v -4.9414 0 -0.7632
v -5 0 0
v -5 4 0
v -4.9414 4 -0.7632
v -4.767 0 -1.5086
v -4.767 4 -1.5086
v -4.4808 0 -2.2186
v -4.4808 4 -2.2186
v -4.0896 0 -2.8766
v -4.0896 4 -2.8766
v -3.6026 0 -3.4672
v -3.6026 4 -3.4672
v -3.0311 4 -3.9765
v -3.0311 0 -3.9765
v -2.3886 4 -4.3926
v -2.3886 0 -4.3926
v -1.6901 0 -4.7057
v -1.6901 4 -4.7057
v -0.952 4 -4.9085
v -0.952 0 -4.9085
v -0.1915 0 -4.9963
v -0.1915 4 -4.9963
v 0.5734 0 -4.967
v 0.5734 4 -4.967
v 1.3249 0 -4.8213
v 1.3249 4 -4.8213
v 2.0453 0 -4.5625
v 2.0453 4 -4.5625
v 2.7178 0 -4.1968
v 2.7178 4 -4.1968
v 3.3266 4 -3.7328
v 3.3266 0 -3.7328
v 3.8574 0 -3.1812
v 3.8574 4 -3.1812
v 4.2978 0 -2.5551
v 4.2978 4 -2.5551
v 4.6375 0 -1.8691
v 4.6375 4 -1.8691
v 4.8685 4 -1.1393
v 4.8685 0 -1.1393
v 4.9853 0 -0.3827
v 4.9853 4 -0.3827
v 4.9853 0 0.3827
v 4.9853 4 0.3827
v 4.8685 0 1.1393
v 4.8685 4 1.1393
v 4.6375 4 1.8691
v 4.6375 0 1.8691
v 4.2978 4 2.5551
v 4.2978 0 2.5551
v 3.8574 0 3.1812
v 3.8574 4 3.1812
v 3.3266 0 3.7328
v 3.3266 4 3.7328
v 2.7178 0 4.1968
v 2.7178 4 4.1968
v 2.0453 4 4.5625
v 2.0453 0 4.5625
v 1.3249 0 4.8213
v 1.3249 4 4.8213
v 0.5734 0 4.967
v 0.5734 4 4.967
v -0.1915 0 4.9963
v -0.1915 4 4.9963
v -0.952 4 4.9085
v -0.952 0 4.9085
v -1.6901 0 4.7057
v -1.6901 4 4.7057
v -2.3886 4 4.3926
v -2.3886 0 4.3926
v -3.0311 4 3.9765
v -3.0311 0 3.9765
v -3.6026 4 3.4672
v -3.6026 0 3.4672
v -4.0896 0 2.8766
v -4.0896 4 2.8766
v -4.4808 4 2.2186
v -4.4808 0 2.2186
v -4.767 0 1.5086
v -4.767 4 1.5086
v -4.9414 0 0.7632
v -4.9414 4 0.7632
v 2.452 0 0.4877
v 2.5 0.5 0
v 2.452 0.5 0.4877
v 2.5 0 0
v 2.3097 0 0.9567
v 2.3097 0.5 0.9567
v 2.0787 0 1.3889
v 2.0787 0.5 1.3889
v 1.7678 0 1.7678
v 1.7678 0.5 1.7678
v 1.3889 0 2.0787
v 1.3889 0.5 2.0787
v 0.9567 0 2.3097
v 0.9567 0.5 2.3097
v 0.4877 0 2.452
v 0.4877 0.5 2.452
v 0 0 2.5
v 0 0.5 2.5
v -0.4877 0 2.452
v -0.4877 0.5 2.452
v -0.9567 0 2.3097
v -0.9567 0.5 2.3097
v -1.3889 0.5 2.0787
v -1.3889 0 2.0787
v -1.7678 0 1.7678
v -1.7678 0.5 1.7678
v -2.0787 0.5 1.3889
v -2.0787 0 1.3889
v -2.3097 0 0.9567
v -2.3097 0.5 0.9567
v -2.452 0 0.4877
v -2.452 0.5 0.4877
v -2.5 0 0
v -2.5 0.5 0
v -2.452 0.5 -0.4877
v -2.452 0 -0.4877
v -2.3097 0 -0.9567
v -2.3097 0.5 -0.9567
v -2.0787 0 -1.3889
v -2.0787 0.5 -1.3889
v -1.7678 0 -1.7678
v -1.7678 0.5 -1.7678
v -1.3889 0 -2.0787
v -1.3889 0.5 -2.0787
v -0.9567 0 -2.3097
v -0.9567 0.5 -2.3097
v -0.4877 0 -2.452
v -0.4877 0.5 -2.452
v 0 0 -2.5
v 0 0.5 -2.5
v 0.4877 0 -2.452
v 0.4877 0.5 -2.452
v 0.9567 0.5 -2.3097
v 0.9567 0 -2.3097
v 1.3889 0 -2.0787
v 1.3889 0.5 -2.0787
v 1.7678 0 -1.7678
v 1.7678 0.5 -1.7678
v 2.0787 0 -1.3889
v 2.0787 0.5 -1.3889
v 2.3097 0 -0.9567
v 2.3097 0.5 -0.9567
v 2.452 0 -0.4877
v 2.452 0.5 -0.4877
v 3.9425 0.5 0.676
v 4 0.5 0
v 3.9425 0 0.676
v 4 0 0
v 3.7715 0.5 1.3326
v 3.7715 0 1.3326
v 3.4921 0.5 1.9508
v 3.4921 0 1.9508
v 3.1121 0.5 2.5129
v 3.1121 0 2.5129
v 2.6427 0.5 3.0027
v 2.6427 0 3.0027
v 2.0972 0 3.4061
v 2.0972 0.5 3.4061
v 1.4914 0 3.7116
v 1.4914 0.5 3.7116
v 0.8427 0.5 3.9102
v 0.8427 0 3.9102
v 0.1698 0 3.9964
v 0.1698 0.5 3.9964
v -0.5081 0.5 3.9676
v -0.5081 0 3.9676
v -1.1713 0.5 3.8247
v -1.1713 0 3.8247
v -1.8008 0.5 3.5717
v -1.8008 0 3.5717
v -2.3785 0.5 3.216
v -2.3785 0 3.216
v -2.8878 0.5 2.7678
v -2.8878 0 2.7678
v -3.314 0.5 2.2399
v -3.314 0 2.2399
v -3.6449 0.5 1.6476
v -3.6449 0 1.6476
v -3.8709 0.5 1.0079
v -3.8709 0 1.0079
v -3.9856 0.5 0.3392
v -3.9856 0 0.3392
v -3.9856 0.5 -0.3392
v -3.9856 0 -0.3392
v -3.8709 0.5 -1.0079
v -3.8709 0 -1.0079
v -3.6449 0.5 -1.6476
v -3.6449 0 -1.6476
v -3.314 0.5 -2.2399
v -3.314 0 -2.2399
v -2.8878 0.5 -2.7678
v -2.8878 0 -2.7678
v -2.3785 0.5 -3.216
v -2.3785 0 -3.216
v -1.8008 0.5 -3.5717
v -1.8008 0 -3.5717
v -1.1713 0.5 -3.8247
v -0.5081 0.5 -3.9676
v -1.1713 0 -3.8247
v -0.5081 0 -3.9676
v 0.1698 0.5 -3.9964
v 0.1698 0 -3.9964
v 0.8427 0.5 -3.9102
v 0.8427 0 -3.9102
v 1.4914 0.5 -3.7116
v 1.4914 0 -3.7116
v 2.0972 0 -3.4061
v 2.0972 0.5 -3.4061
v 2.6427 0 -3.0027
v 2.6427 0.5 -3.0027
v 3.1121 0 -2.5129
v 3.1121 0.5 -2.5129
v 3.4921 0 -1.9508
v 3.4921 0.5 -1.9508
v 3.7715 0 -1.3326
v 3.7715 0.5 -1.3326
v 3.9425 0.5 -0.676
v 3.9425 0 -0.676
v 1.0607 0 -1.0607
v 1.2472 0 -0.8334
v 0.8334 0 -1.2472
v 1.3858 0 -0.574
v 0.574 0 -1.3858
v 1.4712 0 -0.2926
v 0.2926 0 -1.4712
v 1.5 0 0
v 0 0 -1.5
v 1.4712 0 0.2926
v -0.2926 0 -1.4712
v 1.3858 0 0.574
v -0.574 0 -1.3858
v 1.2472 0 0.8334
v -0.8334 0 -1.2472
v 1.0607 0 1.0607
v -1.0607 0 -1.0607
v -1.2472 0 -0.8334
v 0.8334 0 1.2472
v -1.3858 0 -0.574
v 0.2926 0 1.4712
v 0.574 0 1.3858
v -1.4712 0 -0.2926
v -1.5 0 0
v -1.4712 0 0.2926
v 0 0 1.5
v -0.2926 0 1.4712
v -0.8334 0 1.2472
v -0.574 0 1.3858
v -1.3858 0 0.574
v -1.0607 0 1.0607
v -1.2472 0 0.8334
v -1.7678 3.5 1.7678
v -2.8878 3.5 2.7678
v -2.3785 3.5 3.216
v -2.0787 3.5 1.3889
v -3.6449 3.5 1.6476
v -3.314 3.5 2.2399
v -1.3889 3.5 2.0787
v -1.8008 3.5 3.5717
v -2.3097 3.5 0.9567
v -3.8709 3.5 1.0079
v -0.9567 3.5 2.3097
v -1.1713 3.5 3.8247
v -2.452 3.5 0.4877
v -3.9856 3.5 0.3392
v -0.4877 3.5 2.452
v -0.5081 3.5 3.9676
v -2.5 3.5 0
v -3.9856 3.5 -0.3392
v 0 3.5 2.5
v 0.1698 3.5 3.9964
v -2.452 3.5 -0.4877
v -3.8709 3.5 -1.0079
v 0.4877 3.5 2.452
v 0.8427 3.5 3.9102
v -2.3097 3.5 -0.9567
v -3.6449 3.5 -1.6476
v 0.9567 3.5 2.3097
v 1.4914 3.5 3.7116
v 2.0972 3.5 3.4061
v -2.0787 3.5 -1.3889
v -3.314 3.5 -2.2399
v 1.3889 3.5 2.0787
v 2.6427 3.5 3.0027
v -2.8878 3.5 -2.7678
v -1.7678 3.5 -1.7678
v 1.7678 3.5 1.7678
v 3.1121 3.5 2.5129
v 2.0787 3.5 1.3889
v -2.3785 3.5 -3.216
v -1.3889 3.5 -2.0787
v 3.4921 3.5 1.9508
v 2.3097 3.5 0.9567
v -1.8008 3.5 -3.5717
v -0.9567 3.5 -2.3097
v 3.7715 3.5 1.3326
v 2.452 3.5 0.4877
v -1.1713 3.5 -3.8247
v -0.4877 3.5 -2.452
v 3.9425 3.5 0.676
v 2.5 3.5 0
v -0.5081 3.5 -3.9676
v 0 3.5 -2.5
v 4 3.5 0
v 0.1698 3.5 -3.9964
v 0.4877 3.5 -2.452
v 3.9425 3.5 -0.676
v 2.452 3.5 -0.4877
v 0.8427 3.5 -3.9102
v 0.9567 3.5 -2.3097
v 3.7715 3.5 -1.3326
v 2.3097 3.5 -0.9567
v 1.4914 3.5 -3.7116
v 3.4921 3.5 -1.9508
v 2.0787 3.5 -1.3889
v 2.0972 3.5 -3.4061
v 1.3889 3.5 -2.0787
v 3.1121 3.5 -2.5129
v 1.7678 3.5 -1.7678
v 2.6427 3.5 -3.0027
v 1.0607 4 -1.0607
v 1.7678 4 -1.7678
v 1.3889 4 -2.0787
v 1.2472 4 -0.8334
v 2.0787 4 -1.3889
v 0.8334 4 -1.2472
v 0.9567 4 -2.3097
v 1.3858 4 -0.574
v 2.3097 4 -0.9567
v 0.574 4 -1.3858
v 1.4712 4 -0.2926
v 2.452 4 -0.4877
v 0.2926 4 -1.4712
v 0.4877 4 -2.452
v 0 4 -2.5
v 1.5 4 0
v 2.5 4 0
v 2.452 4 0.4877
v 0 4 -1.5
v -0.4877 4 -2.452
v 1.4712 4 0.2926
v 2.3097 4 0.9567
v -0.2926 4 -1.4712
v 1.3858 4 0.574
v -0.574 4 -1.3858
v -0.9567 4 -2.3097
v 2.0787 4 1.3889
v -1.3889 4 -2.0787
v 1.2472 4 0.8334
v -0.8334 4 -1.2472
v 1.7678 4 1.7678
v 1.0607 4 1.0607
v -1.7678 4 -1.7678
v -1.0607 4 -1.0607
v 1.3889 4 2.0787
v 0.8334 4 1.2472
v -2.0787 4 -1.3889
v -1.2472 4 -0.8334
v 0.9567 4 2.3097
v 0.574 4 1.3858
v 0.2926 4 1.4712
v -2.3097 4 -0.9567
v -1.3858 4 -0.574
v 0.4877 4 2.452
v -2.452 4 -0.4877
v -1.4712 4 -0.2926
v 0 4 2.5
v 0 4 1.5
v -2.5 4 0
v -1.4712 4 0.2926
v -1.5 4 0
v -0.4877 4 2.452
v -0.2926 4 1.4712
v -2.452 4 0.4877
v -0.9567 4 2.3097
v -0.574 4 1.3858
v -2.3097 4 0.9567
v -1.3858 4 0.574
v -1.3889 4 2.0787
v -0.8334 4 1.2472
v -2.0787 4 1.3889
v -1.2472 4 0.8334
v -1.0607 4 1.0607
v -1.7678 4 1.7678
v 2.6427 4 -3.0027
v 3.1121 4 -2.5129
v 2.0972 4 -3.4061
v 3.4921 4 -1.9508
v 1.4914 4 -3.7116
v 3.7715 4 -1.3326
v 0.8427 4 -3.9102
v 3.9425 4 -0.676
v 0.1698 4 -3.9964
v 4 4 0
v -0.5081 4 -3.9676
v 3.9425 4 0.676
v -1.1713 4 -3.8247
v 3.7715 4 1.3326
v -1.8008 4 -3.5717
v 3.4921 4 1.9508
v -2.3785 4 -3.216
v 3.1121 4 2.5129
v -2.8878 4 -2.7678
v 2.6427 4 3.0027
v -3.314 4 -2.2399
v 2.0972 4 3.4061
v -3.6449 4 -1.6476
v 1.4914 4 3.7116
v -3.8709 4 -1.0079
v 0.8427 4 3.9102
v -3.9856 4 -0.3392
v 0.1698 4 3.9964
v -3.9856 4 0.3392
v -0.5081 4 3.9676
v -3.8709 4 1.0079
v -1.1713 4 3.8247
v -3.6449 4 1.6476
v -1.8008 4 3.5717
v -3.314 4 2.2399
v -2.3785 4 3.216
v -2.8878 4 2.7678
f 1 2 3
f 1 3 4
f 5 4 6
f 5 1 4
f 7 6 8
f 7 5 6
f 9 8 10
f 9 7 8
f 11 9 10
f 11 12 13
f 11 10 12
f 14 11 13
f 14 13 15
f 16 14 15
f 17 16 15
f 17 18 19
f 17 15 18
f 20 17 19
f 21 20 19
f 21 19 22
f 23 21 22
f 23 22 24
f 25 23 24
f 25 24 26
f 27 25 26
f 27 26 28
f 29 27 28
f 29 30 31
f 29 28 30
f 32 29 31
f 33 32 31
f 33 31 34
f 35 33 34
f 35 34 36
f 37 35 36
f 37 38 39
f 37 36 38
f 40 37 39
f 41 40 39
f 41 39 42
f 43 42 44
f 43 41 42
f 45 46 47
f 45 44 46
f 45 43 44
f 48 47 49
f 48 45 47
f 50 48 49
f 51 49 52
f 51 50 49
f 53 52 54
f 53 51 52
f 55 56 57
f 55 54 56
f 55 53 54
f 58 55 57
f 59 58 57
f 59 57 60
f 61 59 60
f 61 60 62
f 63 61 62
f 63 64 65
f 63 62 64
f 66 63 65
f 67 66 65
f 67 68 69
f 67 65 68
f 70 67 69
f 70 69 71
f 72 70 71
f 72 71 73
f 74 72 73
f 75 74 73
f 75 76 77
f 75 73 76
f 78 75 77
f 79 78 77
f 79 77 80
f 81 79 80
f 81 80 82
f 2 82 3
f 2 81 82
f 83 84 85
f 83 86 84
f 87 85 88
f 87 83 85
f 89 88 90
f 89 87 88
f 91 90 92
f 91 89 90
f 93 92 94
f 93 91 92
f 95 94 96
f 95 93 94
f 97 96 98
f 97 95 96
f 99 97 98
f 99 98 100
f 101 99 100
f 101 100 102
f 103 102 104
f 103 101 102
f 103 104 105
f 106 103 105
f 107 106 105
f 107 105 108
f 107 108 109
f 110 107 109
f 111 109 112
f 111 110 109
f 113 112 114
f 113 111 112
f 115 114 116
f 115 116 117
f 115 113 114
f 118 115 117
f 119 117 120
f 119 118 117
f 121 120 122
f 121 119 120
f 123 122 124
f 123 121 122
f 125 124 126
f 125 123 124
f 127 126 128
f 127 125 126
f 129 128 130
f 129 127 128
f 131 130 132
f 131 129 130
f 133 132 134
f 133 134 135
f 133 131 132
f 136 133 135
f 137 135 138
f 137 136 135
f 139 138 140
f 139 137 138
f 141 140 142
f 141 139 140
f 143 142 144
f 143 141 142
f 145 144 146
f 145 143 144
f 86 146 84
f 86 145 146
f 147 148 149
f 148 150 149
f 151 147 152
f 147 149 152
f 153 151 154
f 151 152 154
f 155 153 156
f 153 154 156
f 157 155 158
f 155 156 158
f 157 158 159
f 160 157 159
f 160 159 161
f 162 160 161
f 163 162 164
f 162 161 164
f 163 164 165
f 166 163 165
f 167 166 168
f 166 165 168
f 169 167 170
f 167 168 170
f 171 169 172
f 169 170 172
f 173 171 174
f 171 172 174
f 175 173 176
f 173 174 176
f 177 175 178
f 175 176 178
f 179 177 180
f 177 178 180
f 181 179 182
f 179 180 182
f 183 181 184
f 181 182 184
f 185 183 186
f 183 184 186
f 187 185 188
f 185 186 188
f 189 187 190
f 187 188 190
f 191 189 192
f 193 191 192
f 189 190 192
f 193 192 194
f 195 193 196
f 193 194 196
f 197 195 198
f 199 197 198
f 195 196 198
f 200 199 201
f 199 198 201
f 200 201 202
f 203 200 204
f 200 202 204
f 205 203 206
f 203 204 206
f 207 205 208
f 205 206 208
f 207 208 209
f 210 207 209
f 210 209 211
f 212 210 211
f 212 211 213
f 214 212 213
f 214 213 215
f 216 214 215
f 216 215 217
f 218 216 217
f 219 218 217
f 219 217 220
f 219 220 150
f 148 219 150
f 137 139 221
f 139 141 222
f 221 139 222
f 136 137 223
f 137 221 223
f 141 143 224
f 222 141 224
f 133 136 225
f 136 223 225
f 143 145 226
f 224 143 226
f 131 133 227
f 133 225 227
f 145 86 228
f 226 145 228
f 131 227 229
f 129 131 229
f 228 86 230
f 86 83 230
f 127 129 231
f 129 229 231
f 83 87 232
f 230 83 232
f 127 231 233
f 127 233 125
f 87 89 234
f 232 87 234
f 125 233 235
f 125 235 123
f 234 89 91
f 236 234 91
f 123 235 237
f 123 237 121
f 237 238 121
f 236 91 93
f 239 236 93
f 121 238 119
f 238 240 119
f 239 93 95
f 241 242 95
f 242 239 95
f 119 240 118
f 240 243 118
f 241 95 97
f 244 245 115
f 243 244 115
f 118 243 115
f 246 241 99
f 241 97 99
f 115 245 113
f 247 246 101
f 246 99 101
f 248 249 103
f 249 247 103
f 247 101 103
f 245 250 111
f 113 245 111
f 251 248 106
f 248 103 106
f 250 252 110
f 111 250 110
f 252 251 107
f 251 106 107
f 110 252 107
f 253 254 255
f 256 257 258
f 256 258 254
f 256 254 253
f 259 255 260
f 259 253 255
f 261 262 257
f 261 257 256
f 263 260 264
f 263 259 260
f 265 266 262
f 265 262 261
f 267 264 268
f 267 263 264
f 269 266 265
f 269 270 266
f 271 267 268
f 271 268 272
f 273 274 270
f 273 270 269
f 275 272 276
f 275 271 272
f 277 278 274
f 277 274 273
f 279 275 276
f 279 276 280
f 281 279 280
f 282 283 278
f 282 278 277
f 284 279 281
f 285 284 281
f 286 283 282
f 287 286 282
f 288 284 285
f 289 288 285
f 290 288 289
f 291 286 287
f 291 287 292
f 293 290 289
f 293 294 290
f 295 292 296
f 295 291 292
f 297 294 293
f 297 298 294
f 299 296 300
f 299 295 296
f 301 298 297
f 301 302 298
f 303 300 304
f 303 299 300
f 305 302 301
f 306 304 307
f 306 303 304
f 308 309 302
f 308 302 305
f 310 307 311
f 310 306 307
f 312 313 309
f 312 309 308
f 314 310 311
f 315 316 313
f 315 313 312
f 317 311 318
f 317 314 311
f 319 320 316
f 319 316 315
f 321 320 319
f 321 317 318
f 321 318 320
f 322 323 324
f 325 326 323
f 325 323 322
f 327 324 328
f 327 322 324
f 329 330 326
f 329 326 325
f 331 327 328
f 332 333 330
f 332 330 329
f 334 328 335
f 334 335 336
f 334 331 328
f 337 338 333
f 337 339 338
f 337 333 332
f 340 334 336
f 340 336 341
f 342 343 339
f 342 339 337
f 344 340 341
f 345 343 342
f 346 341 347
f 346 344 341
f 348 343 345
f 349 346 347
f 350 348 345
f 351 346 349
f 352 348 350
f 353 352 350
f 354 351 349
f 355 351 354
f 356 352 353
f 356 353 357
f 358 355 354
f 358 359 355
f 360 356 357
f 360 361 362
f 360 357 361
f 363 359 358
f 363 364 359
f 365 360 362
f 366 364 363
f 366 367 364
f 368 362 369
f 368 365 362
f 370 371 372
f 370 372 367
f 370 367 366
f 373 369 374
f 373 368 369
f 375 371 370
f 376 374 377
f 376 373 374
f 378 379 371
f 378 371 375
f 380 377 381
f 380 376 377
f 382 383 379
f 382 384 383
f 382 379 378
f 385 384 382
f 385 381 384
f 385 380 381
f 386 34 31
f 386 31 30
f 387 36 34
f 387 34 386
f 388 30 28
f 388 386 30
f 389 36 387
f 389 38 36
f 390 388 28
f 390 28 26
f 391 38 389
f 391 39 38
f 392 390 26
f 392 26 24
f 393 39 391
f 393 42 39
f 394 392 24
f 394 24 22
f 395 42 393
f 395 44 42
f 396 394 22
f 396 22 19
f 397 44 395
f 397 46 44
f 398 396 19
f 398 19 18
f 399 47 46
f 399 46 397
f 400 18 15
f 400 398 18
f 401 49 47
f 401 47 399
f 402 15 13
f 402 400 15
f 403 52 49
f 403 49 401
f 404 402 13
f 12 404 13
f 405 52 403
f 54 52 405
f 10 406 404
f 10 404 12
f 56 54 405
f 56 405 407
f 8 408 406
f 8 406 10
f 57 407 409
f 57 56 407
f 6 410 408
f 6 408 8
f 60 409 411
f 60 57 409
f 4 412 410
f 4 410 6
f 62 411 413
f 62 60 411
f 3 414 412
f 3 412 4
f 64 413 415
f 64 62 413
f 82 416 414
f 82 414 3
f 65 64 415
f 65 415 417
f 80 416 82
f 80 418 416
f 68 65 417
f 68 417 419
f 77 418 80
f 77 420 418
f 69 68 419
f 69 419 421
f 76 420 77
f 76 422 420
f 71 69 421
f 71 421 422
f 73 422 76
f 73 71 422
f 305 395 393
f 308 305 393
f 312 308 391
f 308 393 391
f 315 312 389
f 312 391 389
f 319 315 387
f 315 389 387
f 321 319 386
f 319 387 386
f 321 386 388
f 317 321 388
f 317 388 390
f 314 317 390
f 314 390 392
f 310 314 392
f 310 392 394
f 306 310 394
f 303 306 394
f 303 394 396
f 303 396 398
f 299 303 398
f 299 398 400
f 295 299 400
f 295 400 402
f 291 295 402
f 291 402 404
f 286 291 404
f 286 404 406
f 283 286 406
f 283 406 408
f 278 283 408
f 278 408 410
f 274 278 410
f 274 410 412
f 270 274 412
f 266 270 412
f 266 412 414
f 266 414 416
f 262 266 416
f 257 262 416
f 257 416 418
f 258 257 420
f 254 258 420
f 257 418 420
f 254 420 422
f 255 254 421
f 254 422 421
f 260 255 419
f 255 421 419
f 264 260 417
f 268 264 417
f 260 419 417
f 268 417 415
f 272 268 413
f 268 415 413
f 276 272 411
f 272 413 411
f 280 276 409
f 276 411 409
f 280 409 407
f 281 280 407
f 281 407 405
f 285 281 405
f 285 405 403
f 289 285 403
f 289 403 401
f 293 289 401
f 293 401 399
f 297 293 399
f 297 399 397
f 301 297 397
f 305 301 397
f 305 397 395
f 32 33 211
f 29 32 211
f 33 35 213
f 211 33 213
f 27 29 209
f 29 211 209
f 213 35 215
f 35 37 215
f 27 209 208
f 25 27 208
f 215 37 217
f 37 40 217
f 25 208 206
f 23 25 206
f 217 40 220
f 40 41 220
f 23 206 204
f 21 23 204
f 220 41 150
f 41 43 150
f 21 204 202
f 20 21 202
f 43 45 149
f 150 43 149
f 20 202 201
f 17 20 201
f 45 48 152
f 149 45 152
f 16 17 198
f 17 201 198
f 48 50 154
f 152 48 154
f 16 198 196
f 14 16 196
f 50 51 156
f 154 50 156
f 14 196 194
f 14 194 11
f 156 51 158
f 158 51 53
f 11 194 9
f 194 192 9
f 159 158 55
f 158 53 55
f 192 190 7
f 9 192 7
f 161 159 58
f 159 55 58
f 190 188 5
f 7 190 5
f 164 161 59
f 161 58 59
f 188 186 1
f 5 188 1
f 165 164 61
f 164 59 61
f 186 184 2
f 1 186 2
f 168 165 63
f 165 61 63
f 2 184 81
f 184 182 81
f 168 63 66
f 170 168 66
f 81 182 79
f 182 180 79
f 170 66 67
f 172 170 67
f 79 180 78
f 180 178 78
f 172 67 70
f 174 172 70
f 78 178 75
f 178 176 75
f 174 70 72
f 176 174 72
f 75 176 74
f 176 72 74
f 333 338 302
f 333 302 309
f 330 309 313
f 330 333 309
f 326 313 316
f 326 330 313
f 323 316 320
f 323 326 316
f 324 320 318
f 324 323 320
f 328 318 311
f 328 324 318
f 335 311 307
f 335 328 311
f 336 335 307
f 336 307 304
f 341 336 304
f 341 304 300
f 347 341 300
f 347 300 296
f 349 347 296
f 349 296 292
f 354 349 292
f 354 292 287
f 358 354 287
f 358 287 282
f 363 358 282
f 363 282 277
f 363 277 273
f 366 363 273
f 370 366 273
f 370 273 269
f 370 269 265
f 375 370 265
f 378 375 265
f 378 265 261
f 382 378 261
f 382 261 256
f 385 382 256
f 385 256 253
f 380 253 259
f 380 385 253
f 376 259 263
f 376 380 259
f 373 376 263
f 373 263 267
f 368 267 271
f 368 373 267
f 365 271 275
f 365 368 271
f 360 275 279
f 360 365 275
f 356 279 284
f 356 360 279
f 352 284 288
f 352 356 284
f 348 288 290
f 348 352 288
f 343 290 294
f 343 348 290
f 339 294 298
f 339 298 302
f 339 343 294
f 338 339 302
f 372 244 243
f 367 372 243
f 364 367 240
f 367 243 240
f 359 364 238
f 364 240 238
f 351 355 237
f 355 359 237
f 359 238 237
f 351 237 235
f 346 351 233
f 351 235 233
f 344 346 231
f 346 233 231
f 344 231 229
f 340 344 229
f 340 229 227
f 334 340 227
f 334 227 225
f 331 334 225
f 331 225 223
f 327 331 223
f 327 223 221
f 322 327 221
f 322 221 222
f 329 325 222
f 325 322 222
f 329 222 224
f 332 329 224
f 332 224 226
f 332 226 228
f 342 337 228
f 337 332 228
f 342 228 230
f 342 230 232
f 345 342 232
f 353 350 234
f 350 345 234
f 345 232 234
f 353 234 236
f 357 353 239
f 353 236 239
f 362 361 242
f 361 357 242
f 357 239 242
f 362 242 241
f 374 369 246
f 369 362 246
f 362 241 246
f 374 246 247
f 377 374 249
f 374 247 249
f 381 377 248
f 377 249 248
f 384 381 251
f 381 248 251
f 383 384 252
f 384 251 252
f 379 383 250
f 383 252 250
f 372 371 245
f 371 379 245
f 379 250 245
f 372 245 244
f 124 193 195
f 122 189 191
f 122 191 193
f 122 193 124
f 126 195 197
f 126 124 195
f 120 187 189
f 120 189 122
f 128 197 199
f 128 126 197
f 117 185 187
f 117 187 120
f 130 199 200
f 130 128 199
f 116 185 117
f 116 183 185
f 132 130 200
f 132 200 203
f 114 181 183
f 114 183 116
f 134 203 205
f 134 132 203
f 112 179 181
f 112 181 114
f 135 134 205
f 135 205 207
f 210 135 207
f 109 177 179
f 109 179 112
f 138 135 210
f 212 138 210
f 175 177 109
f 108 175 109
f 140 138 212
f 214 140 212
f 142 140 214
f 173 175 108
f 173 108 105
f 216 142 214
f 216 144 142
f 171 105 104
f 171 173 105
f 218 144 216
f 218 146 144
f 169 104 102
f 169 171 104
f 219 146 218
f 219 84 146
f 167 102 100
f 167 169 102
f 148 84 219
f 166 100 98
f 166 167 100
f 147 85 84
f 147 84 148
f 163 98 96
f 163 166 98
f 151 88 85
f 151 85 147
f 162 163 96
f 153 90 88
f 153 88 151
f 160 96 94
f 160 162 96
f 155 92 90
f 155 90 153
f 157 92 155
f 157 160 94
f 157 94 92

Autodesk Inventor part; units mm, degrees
ref_plane "YZ Plane" through (0, 0, 0) normal (1, 0, 0) x (0, 1, 0)
ref_plane "XZ Plane" through (0, 0, 0) normal (0, 1, 0) x (-1, 0, 0)
ref_plane "XY Plane" through (0, 0, 0) normal (0, 0, 1) x (1, 0, 0)
sketch "Sketch1" plane through (0, 0, 0) normal (0, 1, 0) x (-1, 0, 0)
  circle A0 centre (0, 0) radius 5
  circle A1 centre (0, 0) radius 1.5
  dimension "d0" = 3
  dimension "d1" = 10
extrude "Extrusion1" add sketch "Sketch1" along normal blind 4
sketch "Sketch2" plane through (0, 4, 0) normal (0, 1, 0) x (1, 0, 0)
  circle A0 centre (0, 0) radius 5 projected
  circle A1 centre (0, 0) radius 1.5 projected
  circle A2 centre (0, 0) radius 1.5 projected
  circle A3 centre (0, 0) radius 4
  circle A4 centre (0, 0) radius 2.5
  dimension "d4" = 1
  dimension "d5" = 1
extrude "Extrusion2" cut sketch "Sketch2" against normal blind 0.5 contours A3
sketch "Sketch3" plane through (0, 0, 0) normal (0, -1, 0) x (1, 0, 0)
  circle A0 centre (0, 0) radius 5 projected
  circle A1 centre (0, 0) radius 1.5 projected
  circle A2 centre (0, 0) radius 2.5
  circle A3 centre (0, 0) radius 4
  dimension "d8" = 1
  dimension "d9" = 1
extrude "Extrusion3" cut sketch "Sketch3" against normal blind 0.5 contours A3
properties part number "bearing_d3D10b4"
